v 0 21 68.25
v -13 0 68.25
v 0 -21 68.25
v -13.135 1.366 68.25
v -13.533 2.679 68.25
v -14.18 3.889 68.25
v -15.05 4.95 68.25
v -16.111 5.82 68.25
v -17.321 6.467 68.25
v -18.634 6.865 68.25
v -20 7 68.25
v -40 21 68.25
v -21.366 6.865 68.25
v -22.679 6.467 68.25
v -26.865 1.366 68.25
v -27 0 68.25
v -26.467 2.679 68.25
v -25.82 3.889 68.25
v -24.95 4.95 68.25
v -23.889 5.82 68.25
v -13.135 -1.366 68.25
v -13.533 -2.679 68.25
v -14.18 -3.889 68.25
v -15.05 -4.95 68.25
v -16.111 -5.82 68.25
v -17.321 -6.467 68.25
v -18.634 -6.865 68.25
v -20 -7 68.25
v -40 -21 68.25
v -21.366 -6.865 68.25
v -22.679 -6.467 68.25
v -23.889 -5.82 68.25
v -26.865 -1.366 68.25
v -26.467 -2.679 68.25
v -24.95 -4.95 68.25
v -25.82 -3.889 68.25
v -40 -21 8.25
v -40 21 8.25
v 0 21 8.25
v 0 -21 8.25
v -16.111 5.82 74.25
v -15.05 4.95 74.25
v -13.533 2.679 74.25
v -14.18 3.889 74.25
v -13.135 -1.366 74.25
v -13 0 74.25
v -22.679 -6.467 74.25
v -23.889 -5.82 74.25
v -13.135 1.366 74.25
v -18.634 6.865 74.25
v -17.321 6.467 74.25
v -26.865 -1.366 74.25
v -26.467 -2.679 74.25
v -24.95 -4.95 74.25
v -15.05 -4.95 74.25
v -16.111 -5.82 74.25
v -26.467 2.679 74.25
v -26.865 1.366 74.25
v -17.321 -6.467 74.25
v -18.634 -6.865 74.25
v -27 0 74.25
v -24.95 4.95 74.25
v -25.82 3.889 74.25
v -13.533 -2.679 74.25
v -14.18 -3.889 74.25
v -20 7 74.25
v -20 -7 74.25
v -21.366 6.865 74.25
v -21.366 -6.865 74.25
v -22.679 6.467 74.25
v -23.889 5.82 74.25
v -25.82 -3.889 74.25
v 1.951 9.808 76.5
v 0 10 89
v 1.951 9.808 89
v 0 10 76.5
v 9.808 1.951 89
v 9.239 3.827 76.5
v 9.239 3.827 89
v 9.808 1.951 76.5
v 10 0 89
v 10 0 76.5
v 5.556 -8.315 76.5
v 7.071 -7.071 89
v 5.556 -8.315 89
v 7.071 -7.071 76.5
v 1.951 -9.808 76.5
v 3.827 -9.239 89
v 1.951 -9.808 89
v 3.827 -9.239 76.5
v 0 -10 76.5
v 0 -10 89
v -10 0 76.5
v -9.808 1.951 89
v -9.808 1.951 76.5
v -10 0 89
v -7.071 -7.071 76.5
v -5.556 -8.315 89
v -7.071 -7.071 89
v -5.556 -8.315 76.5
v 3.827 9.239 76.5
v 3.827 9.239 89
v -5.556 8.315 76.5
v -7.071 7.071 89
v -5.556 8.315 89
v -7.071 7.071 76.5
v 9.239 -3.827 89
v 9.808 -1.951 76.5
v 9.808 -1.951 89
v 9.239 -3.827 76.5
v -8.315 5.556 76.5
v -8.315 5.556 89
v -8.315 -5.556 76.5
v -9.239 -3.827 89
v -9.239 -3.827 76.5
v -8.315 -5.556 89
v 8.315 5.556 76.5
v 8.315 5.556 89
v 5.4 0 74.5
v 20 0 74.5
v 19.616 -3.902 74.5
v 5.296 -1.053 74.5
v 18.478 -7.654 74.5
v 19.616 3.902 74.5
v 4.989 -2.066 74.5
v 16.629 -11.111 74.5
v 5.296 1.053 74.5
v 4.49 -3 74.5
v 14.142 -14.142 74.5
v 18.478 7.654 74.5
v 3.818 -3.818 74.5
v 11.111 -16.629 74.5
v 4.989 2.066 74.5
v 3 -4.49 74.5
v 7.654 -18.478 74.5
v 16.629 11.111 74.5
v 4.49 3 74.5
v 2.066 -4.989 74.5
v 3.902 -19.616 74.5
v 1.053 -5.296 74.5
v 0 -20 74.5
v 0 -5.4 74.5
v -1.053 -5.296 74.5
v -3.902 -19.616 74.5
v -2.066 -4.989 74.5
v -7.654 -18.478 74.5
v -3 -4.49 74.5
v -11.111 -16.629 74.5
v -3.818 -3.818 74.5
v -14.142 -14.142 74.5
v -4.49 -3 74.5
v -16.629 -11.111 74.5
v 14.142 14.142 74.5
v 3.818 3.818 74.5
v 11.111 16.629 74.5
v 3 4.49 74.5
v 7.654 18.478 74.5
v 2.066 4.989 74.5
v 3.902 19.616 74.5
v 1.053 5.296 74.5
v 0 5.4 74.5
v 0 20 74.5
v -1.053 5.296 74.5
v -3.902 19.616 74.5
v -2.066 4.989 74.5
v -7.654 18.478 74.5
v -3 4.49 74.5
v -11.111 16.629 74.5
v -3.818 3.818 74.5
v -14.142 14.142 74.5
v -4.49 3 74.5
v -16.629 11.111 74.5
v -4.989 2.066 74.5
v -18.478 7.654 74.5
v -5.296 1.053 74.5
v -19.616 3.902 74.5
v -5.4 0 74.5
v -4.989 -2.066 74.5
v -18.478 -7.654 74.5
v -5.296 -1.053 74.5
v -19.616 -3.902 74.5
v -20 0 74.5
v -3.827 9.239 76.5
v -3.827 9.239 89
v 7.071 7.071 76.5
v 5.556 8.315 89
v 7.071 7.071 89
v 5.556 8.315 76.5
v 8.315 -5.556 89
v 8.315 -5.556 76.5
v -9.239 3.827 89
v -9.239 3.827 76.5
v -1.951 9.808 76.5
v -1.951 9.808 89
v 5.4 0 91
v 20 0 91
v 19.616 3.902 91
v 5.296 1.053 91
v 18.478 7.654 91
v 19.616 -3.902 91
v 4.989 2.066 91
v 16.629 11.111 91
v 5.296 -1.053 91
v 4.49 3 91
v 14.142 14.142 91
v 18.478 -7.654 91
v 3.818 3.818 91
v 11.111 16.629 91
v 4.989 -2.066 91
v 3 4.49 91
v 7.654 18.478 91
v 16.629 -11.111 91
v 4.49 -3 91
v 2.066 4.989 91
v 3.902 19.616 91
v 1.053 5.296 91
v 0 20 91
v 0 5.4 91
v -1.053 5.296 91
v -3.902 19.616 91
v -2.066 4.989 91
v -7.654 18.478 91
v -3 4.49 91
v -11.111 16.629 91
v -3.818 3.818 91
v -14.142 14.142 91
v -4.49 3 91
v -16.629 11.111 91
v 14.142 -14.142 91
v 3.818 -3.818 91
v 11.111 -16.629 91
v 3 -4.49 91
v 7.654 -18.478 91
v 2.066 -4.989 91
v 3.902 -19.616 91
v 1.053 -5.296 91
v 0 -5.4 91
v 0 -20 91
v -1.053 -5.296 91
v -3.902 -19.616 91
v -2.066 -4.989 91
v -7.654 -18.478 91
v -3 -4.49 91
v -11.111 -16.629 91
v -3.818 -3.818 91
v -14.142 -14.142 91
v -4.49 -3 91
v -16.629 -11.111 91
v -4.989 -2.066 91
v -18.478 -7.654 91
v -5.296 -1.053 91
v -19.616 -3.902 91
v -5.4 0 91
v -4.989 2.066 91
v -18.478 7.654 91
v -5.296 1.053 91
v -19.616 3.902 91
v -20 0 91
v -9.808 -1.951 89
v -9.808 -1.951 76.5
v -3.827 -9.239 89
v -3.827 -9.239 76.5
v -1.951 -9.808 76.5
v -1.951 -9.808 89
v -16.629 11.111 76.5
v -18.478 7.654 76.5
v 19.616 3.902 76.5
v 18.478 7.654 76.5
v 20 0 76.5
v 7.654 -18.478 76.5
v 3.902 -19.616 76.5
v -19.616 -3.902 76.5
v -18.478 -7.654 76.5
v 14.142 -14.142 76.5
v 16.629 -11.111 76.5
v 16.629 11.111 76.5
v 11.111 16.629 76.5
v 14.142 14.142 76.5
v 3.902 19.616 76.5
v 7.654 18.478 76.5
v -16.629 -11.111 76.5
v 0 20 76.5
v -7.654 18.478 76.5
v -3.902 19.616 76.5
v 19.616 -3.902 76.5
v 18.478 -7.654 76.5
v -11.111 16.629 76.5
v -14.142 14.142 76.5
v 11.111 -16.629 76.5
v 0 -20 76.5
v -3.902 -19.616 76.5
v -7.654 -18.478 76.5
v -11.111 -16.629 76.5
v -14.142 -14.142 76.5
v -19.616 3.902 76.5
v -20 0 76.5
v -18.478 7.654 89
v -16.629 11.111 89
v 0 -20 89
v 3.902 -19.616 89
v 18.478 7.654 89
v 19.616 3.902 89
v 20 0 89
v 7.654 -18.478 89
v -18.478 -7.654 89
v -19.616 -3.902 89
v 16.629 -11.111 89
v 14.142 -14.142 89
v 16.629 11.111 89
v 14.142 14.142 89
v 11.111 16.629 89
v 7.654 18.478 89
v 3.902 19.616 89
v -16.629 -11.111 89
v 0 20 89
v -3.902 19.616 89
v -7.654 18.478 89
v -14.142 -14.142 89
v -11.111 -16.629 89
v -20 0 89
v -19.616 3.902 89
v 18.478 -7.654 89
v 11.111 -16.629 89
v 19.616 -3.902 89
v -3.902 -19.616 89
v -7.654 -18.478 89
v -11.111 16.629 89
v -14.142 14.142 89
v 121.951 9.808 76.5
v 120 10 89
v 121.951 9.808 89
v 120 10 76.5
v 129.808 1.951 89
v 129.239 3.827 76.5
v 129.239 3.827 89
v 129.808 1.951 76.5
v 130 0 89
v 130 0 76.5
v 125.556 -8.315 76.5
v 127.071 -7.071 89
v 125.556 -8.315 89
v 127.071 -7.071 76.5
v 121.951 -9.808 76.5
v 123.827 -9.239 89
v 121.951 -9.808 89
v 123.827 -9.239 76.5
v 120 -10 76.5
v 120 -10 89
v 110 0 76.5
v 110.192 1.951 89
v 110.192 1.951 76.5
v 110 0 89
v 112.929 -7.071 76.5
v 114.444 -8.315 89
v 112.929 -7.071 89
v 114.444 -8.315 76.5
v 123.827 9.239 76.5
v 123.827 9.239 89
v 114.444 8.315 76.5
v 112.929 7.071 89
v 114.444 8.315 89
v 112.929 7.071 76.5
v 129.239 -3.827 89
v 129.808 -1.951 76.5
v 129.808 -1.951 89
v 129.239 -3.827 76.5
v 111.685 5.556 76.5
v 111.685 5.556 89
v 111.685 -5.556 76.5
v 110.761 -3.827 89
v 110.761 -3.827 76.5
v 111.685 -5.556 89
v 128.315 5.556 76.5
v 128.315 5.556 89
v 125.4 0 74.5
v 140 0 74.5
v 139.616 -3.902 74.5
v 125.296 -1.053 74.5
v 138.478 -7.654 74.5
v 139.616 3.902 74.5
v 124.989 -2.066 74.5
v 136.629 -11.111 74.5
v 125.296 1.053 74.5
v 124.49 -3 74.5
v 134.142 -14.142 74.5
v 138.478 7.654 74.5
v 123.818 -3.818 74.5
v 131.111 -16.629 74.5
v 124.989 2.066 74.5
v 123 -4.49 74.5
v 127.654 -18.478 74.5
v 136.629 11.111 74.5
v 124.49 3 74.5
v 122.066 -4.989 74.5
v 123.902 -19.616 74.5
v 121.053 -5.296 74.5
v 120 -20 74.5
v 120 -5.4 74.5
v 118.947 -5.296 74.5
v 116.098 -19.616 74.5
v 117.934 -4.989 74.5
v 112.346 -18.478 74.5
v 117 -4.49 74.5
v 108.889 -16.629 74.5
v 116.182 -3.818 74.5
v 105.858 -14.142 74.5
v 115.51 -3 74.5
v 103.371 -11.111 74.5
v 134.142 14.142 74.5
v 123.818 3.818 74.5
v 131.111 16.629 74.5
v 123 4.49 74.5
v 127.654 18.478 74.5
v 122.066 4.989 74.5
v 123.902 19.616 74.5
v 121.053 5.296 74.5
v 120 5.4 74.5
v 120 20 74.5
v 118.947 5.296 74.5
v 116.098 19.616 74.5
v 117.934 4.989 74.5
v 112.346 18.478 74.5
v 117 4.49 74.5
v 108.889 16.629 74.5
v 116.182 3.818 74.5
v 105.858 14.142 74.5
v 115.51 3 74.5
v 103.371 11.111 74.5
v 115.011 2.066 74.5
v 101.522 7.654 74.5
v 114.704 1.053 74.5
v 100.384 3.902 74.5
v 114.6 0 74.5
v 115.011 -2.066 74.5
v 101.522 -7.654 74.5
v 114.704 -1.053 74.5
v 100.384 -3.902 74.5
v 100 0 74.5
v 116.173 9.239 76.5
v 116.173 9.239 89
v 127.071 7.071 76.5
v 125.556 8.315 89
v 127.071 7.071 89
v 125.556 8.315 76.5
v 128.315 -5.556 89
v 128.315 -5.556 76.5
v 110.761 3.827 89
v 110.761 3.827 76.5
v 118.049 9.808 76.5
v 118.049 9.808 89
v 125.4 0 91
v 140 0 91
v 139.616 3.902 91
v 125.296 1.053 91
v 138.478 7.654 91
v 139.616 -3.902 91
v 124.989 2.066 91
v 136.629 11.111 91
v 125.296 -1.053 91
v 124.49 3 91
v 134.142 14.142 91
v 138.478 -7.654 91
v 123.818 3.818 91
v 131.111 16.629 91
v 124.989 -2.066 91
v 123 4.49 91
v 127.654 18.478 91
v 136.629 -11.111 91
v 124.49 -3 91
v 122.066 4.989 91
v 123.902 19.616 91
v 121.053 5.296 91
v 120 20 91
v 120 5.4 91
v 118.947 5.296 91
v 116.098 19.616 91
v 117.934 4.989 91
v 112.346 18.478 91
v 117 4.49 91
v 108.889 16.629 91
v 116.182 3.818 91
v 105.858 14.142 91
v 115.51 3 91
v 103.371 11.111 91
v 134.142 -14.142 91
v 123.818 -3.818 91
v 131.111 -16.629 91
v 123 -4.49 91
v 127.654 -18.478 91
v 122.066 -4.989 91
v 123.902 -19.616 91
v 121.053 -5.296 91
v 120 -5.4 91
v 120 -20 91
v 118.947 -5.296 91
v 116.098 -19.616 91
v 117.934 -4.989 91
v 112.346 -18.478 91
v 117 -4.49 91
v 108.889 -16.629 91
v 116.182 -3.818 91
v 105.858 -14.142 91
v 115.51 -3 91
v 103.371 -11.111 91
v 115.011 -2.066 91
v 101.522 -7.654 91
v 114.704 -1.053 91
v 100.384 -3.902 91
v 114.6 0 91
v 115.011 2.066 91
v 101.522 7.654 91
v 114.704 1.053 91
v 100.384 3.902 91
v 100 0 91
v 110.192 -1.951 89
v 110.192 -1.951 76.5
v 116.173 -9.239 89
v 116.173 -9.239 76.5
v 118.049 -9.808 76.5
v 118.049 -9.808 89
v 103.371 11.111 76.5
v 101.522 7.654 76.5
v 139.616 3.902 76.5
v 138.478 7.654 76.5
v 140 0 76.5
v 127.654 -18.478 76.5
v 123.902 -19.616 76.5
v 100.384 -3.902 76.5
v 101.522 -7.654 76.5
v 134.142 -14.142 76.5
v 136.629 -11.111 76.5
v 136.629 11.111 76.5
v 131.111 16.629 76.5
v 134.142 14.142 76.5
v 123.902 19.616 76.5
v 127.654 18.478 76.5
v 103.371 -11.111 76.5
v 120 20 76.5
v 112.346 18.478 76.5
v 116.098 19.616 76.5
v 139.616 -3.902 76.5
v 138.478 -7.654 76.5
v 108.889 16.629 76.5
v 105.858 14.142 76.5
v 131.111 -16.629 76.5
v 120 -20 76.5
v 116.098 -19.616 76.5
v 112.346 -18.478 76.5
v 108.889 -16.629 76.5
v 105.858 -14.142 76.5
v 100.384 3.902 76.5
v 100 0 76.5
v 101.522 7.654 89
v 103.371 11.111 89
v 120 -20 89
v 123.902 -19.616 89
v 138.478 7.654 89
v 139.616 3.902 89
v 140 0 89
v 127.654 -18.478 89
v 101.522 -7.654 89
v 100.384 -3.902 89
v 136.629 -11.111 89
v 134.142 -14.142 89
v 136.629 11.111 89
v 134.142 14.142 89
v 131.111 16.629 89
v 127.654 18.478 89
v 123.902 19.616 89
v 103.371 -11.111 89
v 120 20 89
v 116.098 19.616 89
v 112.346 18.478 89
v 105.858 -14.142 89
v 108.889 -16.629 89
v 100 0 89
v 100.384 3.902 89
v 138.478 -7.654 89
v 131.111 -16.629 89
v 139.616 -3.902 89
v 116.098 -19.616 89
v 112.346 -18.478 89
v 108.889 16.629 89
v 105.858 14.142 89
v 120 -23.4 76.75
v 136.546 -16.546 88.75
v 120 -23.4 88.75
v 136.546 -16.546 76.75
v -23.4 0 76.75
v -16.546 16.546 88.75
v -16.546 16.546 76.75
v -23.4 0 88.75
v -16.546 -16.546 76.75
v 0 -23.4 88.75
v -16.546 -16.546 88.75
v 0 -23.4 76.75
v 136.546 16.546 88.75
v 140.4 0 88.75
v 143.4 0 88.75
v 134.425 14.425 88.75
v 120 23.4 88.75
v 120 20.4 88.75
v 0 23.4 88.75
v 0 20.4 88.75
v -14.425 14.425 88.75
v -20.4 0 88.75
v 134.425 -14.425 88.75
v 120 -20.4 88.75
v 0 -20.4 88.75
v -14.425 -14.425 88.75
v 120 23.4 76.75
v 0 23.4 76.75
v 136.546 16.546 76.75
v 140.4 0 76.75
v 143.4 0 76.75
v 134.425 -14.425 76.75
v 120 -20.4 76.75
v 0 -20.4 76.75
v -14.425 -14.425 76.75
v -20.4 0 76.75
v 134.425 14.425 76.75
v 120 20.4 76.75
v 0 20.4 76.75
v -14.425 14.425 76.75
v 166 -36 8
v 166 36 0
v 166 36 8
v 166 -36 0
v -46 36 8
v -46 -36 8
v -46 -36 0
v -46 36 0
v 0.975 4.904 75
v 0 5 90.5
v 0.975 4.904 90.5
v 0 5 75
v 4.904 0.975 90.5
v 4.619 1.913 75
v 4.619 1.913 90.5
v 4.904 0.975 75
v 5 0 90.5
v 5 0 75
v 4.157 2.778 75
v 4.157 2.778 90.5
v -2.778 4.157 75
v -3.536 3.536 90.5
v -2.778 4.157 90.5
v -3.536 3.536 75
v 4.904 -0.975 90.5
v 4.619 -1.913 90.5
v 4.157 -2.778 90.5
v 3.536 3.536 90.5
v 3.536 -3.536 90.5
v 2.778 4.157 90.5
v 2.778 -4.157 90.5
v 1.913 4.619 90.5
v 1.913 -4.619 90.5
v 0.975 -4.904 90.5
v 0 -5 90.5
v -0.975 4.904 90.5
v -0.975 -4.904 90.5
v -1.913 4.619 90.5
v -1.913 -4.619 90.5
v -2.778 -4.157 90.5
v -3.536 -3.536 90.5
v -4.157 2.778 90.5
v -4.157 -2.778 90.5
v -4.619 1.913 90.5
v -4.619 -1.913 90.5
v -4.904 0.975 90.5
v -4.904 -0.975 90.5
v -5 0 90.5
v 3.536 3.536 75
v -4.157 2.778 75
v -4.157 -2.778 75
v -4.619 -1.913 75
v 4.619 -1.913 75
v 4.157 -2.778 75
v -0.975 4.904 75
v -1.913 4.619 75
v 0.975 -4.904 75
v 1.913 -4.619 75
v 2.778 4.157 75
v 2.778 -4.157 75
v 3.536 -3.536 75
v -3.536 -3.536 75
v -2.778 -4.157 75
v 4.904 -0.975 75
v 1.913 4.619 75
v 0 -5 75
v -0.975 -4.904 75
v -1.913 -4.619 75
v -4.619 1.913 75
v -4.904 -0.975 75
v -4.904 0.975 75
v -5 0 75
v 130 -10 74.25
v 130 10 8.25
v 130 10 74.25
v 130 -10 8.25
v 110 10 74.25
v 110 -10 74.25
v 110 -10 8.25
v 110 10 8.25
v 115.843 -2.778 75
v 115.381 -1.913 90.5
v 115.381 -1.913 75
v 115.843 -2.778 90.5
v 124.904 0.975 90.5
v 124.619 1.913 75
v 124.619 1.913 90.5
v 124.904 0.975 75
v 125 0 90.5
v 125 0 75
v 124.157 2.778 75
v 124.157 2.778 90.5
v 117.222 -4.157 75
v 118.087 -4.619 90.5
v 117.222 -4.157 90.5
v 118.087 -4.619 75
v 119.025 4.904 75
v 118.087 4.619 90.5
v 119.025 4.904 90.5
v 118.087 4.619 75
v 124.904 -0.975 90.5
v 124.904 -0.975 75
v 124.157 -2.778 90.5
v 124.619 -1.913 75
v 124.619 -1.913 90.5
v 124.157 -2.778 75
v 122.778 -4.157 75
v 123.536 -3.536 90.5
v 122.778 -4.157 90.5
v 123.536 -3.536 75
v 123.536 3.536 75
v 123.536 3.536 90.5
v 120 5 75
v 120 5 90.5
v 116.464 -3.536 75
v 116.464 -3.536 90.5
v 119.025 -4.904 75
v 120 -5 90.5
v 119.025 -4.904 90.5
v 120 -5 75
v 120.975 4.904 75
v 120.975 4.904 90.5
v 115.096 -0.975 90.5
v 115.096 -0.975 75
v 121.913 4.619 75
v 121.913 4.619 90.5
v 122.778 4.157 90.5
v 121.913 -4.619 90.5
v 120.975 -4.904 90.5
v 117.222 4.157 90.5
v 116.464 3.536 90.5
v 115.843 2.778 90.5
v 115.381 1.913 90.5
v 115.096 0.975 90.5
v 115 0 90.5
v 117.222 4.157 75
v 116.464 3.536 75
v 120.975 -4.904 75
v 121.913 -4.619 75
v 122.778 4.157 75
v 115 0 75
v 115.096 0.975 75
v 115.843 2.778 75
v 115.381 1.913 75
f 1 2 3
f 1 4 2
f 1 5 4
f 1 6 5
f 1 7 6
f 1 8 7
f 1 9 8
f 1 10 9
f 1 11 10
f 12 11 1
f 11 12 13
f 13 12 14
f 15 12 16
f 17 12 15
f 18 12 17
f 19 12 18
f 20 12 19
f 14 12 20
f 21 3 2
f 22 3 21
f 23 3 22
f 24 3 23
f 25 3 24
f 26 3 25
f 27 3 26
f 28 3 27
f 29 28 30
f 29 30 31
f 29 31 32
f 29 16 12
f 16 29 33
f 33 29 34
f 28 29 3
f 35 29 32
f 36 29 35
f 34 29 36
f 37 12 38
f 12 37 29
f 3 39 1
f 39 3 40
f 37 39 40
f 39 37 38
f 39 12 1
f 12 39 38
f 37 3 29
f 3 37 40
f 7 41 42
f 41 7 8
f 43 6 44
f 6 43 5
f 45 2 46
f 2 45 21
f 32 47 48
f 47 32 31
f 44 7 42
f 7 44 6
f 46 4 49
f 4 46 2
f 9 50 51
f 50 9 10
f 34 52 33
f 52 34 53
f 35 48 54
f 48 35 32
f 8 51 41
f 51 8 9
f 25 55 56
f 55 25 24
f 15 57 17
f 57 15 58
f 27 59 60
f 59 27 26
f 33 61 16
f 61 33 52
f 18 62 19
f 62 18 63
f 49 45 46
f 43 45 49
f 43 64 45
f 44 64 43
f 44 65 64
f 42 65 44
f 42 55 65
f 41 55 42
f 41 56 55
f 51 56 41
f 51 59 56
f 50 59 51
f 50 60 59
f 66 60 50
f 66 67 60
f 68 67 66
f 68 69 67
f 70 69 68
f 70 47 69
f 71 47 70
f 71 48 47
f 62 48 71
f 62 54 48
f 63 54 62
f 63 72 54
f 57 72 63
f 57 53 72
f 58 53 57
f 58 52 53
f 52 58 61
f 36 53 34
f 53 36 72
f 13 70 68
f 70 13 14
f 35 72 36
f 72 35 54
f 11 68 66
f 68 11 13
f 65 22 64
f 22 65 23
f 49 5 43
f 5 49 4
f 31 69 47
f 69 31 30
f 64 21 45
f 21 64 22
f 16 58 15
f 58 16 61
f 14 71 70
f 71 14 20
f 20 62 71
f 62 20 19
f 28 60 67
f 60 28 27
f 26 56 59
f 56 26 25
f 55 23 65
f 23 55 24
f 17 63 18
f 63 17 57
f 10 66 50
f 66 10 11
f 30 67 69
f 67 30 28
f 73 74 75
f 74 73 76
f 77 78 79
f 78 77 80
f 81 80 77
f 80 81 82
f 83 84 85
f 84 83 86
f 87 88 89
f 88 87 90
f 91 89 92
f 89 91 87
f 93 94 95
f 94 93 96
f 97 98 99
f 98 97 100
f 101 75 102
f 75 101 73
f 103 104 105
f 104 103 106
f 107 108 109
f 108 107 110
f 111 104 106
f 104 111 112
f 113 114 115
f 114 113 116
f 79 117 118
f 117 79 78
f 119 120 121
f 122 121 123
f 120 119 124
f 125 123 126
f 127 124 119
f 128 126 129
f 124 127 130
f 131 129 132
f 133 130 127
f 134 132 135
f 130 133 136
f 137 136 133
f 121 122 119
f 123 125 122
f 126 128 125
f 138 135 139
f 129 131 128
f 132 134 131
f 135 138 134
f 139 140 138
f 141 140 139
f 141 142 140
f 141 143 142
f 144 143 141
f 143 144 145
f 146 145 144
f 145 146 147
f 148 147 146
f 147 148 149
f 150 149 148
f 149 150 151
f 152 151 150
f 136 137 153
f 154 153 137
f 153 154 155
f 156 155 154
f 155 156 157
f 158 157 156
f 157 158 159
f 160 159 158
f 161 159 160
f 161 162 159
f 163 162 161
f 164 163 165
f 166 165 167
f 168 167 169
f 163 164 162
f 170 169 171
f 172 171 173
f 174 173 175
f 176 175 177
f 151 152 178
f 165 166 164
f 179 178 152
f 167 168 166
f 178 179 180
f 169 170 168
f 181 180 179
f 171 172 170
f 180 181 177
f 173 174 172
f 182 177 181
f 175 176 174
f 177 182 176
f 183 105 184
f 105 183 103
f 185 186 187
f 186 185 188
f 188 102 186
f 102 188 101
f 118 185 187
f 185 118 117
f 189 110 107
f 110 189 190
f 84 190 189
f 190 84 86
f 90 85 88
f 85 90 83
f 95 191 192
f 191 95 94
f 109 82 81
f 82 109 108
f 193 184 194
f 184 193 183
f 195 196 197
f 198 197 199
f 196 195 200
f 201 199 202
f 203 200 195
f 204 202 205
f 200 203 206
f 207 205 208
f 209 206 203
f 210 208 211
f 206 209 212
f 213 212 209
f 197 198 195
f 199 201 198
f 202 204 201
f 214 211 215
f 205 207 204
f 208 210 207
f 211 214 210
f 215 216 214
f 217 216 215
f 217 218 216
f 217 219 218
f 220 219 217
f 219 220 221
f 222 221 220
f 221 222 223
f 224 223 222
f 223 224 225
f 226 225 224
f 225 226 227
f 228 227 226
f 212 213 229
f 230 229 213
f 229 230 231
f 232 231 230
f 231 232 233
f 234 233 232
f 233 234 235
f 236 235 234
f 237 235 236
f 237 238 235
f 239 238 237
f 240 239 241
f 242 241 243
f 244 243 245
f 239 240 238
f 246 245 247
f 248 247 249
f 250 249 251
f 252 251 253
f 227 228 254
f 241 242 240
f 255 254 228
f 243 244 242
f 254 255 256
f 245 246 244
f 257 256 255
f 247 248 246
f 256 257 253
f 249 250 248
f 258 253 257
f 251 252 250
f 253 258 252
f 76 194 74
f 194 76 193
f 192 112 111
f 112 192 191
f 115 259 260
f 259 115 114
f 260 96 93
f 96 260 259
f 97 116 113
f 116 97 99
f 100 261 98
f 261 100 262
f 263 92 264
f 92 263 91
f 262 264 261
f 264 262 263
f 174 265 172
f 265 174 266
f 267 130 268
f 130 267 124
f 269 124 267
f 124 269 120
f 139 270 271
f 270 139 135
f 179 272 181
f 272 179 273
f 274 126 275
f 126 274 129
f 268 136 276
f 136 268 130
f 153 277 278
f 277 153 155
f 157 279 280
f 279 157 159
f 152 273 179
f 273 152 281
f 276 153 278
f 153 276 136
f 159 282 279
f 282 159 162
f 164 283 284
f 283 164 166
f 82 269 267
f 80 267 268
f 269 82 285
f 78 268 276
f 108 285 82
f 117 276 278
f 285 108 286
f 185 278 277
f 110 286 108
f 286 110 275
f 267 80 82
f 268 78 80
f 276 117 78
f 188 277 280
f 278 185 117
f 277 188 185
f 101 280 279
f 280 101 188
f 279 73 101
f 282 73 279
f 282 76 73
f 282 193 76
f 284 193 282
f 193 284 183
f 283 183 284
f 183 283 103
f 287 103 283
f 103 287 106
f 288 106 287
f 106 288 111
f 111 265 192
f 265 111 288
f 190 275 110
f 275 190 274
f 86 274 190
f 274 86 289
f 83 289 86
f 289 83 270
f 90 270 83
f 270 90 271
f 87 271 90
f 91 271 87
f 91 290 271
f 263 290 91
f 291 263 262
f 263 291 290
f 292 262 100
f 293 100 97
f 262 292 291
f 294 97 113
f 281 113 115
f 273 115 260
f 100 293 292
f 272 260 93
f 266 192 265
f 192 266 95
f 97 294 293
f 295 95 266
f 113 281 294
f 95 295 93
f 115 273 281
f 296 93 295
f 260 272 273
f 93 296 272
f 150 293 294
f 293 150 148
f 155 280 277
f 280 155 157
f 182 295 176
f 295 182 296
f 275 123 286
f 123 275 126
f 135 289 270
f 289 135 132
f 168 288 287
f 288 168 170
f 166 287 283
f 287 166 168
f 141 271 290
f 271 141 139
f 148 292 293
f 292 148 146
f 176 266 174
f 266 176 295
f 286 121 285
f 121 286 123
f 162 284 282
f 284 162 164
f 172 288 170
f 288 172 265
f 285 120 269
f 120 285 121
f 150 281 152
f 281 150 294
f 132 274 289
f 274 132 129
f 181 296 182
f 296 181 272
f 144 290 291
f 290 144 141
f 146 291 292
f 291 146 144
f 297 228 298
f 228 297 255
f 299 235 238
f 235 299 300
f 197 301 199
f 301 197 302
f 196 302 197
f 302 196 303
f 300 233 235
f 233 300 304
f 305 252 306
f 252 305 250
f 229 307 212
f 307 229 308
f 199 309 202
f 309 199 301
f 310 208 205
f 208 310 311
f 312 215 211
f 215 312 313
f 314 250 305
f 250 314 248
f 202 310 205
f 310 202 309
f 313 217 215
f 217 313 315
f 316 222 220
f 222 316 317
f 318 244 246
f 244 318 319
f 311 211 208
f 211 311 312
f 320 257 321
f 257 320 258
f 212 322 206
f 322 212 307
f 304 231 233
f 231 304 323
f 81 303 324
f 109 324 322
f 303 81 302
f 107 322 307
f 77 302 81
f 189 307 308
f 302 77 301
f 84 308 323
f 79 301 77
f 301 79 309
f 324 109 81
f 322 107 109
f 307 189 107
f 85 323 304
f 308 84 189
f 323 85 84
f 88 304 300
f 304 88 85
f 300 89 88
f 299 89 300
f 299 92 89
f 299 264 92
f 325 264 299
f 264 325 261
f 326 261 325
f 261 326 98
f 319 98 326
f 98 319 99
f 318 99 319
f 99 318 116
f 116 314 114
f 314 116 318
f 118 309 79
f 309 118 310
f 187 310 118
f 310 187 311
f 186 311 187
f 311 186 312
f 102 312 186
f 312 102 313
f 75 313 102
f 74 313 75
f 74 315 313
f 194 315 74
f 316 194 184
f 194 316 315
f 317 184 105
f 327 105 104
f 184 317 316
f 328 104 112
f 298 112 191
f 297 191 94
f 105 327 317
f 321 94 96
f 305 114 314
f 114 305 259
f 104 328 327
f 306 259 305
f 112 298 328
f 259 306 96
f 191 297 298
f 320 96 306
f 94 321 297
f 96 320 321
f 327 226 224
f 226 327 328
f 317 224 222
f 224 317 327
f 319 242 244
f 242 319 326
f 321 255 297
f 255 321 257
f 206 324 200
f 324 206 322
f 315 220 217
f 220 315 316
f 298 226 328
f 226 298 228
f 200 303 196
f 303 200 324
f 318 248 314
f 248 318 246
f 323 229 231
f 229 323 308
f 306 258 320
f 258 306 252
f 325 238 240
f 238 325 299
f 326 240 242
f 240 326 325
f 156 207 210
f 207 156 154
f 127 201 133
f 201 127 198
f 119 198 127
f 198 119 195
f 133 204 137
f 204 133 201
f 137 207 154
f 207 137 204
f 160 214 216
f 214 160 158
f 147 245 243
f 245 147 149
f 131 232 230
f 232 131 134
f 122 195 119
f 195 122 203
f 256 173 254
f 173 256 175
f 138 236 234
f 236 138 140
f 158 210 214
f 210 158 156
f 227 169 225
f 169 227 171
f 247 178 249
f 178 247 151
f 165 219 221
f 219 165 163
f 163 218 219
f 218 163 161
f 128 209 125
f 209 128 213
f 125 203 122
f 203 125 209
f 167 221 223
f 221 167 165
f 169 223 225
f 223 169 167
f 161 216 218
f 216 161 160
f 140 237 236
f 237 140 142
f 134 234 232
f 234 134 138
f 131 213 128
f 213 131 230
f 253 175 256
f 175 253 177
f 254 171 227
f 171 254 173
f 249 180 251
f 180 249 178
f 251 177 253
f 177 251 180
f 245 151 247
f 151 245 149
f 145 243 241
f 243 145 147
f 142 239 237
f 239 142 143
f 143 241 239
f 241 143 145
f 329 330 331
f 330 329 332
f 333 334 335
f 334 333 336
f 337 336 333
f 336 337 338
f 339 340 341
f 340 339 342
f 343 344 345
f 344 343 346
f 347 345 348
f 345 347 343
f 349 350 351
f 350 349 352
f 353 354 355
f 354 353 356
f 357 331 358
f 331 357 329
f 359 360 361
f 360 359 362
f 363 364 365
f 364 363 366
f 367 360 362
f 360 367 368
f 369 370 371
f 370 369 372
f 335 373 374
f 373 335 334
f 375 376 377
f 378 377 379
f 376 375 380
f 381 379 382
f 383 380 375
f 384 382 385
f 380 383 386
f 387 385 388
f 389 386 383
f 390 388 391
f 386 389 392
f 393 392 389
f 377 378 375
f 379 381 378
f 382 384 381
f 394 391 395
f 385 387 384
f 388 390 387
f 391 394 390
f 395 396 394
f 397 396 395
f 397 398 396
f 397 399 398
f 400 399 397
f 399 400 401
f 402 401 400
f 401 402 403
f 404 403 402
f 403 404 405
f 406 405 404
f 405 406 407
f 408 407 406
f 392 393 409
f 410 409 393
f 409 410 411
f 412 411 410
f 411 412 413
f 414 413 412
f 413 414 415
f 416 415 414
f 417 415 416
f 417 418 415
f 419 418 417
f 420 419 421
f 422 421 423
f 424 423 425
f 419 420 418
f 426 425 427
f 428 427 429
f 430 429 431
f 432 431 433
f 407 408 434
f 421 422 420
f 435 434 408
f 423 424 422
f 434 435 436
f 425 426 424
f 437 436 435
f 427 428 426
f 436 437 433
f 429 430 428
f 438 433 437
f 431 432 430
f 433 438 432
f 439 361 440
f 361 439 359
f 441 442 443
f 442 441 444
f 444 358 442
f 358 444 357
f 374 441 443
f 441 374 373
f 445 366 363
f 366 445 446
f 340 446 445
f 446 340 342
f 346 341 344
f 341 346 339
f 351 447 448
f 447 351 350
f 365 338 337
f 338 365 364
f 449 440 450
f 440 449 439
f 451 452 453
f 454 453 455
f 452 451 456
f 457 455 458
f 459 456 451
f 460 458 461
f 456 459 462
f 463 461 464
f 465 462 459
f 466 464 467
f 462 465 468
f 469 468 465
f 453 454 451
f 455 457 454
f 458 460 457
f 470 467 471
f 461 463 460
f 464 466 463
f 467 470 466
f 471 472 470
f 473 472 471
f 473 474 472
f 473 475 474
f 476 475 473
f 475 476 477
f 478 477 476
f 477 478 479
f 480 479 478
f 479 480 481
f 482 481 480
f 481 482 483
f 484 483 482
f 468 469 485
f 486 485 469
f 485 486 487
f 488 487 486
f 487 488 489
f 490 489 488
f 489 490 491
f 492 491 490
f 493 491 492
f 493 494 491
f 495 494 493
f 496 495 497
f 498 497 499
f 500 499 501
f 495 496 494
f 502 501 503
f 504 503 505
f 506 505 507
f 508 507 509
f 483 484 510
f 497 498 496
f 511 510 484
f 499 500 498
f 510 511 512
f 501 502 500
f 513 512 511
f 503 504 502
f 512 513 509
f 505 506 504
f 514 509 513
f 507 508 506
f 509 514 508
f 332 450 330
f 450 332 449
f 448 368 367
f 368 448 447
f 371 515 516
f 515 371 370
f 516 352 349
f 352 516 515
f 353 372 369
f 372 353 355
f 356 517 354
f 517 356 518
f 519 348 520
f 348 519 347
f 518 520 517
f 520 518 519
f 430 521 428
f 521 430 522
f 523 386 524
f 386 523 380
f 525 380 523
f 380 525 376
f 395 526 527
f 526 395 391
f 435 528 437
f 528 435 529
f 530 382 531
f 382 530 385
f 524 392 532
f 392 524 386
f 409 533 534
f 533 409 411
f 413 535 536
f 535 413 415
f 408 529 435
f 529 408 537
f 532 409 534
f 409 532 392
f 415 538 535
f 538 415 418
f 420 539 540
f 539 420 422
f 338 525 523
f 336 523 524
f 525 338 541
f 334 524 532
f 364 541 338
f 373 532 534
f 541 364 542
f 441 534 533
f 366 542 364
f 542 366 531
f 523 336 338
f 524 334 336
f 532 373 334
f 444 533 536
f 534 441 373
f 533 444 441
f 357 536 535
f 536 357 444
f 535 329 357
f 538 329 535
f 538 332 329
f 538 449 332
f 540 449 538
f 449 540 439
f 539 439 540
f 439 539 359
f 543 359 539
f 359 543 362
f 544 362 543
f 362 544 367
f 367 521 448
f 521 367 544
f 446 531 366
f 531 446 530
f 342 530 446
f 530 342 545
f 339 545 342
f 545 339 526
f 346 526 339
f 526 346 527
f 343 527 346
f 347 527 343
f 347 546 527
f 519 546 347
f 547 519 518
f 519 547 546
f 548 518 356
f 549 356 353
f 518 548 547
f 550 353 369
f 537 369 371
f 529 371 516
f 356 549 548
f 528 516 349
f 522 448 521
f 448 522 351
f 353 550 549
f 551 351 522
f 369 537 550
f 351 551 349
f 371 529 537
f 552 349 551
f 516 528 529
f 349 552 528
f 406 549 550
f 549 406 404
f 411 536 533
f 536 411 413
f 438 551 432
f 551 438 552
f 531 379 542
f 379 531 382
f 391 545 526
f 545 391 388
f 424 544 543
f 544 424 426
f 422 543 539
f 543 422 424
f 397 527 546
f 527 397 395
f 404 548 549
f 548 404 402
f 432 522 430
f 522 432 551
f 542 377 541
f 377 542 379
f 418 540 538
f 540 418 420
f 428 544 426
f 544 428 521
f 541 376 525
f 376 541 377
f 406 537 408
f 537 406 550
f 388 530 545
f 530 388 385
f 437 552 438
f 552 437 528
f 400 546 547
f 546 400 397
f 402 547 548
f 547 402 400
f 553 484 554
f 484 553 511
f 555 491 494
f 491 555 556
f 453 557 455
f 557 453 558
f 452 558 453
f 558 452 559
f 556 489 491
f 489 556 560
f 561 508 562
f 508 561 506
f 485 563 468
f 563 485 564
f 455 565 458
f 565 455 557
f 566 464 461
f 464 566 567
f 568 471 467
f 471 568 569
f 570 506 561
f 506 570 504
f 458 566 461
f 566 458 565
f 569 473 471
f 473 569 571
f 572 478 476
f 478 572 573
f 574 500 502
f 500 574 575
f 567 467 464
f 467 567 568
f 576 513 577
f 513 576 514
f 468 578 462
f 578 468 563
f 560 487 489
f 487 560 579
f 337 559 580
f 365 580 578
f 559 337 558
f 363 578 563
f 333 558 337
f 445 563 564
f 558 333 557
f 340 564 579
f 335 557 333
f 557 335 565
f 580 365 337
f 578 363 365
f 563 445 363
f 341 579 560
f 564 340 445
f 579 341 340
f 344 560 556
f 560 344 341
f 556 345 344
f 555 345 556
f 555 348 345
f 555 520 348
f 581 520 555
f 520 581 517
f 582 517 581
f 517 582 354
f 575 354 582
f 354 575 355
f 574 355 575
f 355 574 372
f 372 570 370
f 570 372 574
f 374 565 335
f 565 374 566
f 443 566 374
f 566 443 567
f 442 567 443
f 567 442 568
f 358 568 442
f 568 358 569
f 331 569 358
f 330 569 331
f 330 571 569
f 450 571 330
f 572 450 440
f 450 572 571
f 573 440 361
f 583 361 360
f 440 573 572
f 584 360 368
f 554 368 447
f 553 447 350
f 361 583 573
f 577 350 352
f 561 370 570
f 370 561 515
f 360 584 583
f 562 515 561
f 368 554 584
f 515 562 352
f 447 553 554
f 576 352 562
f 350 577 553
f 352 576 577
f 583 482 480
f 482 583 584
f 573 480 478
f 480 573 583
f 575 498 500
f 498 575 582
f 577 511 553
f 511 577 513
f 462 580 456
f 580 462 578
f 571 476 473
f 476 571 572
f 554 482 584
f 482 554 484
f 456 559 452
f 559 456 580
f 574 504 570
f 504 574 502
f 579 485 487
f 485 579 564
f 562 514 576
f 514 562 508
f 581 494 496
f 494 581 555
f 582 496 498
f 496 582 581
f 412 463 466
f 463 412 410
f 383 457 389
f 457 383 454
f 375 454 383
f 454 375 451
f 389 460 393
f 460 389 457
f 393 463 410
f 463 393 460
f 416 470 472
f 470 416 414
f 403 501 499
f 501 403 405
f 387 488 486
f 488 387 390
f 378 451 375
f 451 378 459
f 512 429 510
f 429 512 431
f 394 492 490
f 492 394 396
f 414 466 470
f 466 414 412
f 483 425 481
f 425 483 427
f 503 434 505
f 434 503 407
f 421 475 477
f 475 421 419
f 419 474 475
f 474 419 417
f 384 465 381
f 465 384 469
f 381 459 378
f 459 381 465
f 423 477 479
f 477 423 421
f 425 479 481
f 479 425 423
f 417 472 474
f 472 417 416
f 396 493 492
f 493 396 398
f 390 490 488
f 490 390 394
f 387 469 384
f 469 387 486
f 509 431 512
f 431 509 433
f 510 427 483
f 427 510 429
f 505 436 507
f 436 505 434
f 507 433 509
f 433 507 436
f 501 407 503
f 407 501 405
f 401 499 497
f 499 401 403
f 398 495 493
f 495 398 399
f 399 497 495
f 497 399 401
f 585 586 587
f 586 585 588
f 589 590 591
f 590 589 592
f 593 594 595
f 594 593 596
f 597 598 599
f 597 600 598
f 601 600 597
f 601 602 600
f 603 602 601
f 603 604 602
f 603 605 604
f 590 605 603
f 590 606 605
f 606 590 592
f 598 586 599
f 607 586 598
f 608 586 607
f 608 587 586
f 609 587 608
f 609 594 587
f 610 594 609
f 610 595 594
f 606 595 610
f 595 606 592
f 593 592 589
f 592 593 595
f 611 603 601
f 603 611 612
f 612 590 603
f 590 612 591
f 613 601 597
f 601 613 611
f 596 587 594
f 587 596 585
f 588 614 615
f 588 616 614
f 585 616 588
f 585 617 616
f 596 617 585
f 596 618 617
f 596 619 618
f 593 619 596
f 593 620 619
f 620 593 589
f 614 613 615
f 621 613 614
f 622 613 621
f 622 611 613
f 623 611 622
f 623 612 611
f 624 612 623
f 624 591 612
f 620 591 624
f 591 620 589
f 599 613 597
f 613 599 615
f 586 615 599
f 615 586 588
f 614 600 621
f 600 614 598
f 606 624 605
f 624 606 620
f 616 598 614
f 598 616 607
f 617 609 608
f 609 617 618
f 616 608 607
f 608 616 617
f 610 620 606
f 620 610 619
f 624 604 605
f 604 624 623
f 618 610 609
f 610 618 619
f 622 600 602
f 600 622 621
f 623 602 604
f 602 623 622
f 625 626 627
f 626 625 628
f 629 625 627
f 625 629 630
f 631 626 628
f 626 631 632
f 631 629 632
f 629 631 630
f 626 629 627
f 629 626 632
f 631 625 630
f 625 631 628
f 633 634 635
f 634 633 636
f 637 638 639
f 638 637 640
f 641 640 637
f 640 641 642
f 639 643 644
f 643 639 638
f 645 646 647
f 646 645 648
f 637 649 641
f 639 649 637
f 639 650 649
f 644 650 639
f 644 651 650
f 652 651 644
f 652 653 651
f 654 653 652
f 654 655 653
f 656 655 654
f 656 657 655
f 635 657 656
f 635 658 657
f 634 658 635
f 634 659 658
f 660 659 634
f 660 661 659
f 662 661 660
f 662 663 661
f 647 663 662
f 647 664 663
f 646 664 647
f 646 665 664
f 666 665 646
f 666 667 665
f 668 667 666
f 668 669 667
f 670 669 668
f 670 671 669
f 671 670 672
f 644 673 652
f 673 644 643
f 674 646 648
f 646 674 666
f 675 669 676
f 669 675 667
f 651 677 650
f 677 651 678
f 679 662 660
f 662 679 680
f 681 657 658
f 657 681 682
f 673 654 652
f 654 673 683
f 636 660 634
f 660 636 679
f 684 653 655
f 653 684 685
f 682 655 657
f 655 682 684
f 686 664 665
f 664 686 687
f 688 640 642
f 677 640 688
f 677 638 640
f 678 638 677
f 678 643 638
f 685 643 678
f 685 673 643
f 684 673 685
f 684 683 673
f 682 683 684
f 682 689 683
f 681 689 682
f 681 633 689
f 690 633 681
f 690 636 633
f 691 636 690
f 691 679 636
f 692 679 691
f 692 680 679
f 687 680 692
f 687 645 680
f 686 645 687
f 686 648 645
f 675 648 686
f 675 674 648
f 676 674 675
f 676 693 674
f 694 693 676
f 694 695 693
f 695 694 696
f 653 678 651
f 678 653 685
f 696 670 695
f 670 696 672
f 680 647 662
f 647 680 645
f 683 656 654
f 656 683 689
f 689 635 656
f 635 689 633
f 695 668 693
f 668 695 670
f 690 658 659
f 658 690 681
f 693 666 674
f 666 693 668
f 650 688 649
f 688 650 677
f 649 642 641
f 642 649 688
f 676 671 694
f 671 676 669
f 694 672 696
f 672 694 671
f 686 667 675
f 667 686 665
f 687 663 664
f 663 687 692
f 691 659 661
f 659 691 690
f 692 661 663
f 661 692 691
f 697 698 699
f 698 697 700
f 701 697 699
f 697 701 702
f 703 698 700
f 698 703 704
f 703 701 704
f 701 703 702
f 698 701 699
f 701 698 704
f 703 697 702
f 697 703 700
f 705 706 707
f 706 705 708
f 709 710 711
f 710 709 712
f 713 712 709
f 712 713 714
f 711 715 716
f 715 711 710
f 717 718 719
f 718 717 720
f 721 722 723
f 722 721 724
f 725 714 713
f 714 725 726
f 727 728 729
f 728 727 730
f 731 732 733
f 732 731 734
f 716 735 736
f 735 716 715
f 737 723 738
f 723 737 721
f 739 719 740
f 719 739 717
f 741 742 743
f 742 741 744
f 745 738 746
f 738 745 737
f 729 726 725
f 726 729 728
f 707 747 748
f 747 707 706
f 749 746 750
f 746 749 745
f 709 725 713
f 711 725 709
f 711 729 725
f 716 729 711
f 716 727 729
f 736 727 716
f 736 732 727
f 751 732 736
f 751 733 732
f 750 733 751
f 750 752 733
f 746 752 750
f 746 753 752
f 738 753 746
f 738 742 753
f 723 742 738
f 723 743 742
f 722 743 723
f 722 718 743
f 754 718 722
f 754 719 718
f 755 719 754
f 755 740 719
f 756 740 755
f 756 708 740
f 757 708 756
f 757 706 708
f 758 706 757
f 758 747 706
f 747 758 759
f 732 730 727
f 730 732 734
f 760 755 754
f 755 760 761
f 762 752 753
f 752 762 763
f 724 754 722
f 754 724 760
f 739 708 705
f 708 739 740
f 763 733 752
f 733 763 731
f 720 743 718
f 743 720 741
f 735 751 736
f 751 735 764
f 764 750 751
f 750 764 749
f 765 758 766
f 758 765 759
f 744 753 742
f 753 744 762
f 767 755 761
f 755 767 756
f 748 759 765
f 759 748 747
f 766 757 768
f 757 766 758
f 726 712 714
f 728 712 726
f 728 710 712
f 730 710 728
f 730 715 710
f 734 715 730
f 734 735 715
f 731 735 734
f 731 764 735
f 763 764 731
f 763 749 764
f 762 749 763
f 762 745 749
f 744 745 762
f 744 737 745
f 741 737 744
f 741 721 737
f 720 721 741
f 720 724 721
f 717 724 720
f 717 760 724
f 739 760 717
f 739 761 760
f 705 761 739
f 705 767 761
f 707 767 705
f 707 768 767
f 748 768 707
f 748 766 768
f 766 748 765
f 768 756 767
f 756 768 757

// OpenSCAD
$fn = 32;

// ------------------------------------------------------------------------
// Motor belt drive: span 120 mm, pulleys d40, belt 12 mm wide
// Every part is its own module, assembly() places every instance.
// ------------------------------------------------------------------------

// --- part 1 ---
module base_plate() {
  difference() {
    translate([-106, -36, 0]) cube([212, 72, 8]);
  }
}

// --- part 2 ---
module motor() {
  union() {
    translate([-30, -21, 0]) cube([60, 42, 40]);
    translate([33, 0, 20]) rotate([0, 90, 0]) cylinder(h = 6, d = 14, center = true);
  }
}

// --- part 3 ---
module drive_shaft() {
  translate([0, 0, -7.75]) cylinder(h = 15.5, d = 10);
}

// --- part 4 ---
module pulley_drive() {
  difference() {
    union() {
      cylinder(h = 16.5, d = 20);
      cylinder(h = 2, d = 40);
      translate([0, 0, 14.5]) cylinder(h = 2, d = 40);
    }
    translate([0, 0, -1]) cylinder(h = 18.5, d = 10.8);
  }
}

// --- part 5 ---
module idler_post() {
  translate([-10, -10, 0]) cube([20, 20, 66]);
}

// --- part 6 ---
module driven_shaft() {
  translate([0, 0, -7.75]) cylinder(h = 15.5, d = 10);
}

// --- part 7 ---
module pulley_driven() {
  difference() {
    union() {
      cylinder(h = 16.5, d = 20);
      cylinder(h = 2, d = 40);
      translate([0, 0, 14.5]) cylinder(h = 2, d = 40);
    }
    translate([0, 0, -1]) cylinder(h = 18.5, d = 10.8);
  }
}

// --- part 8 ---
module drive_belt() {
  difference() {
    linear_extrude(height = 12) polygon(points = concat([for (a = [90 : 45 : 270]) [23.4 * cos(a), 23.4 * sin(a)]], [for (a = [270 : 45 : 450]) [120 + 23.4 * cos(a), 23.4 * sin(a)]]));
    translate([0, 0, -1]) linear_extrude(height = 14) polygon(points = concat([for (a = [90 : 45 : 270]) [20.4 * cos(a), 20.4 * sin(a)]], [for (a = [270 : 45 : 450]) [120 + 20.4 * cos(a), 20.4 * sin(a)]]));
  }
}

// --- assembly ---
module assembly() {
  color([0.80, 0.24, 0.20]) translate([60, 0, 0]) rotate([0, 0, 0]) base_plate();
  color([0.20, 0.45, 0.75]) translate([0, 0, 38.25]) rotate([0, 270, 0]) motor();
  color([0.25, 0.62, 0.32]) translate([0, 0, 82.75]) rotate([0, 0, 0]) drive_shaft();
  color([0.92, 0.70, 0.18]) translate([0, 0, 74.5]) rotate([0, 0, 0]) pulley_drive();
  color([0.58, 0.35, 0.70]) translate([120, 0, 8.25]) rotate([0, 0, 0]) idler_post();
  color([0.16, 0.66, 0.66]) translate([120, 0, 82.75]) rotate([0, 0, 0]) driven_shaft();
  color([0.85, 0.48, 0.18]) translate([120, 0, 74.5]) rotate([0, 0, 0]) pulley_driven();
  color([0.55, 0.60, 0.65]) translate([0, 0, 76.75]) rotate([0, 0, 0]) drive_belt();
}

assembly();
